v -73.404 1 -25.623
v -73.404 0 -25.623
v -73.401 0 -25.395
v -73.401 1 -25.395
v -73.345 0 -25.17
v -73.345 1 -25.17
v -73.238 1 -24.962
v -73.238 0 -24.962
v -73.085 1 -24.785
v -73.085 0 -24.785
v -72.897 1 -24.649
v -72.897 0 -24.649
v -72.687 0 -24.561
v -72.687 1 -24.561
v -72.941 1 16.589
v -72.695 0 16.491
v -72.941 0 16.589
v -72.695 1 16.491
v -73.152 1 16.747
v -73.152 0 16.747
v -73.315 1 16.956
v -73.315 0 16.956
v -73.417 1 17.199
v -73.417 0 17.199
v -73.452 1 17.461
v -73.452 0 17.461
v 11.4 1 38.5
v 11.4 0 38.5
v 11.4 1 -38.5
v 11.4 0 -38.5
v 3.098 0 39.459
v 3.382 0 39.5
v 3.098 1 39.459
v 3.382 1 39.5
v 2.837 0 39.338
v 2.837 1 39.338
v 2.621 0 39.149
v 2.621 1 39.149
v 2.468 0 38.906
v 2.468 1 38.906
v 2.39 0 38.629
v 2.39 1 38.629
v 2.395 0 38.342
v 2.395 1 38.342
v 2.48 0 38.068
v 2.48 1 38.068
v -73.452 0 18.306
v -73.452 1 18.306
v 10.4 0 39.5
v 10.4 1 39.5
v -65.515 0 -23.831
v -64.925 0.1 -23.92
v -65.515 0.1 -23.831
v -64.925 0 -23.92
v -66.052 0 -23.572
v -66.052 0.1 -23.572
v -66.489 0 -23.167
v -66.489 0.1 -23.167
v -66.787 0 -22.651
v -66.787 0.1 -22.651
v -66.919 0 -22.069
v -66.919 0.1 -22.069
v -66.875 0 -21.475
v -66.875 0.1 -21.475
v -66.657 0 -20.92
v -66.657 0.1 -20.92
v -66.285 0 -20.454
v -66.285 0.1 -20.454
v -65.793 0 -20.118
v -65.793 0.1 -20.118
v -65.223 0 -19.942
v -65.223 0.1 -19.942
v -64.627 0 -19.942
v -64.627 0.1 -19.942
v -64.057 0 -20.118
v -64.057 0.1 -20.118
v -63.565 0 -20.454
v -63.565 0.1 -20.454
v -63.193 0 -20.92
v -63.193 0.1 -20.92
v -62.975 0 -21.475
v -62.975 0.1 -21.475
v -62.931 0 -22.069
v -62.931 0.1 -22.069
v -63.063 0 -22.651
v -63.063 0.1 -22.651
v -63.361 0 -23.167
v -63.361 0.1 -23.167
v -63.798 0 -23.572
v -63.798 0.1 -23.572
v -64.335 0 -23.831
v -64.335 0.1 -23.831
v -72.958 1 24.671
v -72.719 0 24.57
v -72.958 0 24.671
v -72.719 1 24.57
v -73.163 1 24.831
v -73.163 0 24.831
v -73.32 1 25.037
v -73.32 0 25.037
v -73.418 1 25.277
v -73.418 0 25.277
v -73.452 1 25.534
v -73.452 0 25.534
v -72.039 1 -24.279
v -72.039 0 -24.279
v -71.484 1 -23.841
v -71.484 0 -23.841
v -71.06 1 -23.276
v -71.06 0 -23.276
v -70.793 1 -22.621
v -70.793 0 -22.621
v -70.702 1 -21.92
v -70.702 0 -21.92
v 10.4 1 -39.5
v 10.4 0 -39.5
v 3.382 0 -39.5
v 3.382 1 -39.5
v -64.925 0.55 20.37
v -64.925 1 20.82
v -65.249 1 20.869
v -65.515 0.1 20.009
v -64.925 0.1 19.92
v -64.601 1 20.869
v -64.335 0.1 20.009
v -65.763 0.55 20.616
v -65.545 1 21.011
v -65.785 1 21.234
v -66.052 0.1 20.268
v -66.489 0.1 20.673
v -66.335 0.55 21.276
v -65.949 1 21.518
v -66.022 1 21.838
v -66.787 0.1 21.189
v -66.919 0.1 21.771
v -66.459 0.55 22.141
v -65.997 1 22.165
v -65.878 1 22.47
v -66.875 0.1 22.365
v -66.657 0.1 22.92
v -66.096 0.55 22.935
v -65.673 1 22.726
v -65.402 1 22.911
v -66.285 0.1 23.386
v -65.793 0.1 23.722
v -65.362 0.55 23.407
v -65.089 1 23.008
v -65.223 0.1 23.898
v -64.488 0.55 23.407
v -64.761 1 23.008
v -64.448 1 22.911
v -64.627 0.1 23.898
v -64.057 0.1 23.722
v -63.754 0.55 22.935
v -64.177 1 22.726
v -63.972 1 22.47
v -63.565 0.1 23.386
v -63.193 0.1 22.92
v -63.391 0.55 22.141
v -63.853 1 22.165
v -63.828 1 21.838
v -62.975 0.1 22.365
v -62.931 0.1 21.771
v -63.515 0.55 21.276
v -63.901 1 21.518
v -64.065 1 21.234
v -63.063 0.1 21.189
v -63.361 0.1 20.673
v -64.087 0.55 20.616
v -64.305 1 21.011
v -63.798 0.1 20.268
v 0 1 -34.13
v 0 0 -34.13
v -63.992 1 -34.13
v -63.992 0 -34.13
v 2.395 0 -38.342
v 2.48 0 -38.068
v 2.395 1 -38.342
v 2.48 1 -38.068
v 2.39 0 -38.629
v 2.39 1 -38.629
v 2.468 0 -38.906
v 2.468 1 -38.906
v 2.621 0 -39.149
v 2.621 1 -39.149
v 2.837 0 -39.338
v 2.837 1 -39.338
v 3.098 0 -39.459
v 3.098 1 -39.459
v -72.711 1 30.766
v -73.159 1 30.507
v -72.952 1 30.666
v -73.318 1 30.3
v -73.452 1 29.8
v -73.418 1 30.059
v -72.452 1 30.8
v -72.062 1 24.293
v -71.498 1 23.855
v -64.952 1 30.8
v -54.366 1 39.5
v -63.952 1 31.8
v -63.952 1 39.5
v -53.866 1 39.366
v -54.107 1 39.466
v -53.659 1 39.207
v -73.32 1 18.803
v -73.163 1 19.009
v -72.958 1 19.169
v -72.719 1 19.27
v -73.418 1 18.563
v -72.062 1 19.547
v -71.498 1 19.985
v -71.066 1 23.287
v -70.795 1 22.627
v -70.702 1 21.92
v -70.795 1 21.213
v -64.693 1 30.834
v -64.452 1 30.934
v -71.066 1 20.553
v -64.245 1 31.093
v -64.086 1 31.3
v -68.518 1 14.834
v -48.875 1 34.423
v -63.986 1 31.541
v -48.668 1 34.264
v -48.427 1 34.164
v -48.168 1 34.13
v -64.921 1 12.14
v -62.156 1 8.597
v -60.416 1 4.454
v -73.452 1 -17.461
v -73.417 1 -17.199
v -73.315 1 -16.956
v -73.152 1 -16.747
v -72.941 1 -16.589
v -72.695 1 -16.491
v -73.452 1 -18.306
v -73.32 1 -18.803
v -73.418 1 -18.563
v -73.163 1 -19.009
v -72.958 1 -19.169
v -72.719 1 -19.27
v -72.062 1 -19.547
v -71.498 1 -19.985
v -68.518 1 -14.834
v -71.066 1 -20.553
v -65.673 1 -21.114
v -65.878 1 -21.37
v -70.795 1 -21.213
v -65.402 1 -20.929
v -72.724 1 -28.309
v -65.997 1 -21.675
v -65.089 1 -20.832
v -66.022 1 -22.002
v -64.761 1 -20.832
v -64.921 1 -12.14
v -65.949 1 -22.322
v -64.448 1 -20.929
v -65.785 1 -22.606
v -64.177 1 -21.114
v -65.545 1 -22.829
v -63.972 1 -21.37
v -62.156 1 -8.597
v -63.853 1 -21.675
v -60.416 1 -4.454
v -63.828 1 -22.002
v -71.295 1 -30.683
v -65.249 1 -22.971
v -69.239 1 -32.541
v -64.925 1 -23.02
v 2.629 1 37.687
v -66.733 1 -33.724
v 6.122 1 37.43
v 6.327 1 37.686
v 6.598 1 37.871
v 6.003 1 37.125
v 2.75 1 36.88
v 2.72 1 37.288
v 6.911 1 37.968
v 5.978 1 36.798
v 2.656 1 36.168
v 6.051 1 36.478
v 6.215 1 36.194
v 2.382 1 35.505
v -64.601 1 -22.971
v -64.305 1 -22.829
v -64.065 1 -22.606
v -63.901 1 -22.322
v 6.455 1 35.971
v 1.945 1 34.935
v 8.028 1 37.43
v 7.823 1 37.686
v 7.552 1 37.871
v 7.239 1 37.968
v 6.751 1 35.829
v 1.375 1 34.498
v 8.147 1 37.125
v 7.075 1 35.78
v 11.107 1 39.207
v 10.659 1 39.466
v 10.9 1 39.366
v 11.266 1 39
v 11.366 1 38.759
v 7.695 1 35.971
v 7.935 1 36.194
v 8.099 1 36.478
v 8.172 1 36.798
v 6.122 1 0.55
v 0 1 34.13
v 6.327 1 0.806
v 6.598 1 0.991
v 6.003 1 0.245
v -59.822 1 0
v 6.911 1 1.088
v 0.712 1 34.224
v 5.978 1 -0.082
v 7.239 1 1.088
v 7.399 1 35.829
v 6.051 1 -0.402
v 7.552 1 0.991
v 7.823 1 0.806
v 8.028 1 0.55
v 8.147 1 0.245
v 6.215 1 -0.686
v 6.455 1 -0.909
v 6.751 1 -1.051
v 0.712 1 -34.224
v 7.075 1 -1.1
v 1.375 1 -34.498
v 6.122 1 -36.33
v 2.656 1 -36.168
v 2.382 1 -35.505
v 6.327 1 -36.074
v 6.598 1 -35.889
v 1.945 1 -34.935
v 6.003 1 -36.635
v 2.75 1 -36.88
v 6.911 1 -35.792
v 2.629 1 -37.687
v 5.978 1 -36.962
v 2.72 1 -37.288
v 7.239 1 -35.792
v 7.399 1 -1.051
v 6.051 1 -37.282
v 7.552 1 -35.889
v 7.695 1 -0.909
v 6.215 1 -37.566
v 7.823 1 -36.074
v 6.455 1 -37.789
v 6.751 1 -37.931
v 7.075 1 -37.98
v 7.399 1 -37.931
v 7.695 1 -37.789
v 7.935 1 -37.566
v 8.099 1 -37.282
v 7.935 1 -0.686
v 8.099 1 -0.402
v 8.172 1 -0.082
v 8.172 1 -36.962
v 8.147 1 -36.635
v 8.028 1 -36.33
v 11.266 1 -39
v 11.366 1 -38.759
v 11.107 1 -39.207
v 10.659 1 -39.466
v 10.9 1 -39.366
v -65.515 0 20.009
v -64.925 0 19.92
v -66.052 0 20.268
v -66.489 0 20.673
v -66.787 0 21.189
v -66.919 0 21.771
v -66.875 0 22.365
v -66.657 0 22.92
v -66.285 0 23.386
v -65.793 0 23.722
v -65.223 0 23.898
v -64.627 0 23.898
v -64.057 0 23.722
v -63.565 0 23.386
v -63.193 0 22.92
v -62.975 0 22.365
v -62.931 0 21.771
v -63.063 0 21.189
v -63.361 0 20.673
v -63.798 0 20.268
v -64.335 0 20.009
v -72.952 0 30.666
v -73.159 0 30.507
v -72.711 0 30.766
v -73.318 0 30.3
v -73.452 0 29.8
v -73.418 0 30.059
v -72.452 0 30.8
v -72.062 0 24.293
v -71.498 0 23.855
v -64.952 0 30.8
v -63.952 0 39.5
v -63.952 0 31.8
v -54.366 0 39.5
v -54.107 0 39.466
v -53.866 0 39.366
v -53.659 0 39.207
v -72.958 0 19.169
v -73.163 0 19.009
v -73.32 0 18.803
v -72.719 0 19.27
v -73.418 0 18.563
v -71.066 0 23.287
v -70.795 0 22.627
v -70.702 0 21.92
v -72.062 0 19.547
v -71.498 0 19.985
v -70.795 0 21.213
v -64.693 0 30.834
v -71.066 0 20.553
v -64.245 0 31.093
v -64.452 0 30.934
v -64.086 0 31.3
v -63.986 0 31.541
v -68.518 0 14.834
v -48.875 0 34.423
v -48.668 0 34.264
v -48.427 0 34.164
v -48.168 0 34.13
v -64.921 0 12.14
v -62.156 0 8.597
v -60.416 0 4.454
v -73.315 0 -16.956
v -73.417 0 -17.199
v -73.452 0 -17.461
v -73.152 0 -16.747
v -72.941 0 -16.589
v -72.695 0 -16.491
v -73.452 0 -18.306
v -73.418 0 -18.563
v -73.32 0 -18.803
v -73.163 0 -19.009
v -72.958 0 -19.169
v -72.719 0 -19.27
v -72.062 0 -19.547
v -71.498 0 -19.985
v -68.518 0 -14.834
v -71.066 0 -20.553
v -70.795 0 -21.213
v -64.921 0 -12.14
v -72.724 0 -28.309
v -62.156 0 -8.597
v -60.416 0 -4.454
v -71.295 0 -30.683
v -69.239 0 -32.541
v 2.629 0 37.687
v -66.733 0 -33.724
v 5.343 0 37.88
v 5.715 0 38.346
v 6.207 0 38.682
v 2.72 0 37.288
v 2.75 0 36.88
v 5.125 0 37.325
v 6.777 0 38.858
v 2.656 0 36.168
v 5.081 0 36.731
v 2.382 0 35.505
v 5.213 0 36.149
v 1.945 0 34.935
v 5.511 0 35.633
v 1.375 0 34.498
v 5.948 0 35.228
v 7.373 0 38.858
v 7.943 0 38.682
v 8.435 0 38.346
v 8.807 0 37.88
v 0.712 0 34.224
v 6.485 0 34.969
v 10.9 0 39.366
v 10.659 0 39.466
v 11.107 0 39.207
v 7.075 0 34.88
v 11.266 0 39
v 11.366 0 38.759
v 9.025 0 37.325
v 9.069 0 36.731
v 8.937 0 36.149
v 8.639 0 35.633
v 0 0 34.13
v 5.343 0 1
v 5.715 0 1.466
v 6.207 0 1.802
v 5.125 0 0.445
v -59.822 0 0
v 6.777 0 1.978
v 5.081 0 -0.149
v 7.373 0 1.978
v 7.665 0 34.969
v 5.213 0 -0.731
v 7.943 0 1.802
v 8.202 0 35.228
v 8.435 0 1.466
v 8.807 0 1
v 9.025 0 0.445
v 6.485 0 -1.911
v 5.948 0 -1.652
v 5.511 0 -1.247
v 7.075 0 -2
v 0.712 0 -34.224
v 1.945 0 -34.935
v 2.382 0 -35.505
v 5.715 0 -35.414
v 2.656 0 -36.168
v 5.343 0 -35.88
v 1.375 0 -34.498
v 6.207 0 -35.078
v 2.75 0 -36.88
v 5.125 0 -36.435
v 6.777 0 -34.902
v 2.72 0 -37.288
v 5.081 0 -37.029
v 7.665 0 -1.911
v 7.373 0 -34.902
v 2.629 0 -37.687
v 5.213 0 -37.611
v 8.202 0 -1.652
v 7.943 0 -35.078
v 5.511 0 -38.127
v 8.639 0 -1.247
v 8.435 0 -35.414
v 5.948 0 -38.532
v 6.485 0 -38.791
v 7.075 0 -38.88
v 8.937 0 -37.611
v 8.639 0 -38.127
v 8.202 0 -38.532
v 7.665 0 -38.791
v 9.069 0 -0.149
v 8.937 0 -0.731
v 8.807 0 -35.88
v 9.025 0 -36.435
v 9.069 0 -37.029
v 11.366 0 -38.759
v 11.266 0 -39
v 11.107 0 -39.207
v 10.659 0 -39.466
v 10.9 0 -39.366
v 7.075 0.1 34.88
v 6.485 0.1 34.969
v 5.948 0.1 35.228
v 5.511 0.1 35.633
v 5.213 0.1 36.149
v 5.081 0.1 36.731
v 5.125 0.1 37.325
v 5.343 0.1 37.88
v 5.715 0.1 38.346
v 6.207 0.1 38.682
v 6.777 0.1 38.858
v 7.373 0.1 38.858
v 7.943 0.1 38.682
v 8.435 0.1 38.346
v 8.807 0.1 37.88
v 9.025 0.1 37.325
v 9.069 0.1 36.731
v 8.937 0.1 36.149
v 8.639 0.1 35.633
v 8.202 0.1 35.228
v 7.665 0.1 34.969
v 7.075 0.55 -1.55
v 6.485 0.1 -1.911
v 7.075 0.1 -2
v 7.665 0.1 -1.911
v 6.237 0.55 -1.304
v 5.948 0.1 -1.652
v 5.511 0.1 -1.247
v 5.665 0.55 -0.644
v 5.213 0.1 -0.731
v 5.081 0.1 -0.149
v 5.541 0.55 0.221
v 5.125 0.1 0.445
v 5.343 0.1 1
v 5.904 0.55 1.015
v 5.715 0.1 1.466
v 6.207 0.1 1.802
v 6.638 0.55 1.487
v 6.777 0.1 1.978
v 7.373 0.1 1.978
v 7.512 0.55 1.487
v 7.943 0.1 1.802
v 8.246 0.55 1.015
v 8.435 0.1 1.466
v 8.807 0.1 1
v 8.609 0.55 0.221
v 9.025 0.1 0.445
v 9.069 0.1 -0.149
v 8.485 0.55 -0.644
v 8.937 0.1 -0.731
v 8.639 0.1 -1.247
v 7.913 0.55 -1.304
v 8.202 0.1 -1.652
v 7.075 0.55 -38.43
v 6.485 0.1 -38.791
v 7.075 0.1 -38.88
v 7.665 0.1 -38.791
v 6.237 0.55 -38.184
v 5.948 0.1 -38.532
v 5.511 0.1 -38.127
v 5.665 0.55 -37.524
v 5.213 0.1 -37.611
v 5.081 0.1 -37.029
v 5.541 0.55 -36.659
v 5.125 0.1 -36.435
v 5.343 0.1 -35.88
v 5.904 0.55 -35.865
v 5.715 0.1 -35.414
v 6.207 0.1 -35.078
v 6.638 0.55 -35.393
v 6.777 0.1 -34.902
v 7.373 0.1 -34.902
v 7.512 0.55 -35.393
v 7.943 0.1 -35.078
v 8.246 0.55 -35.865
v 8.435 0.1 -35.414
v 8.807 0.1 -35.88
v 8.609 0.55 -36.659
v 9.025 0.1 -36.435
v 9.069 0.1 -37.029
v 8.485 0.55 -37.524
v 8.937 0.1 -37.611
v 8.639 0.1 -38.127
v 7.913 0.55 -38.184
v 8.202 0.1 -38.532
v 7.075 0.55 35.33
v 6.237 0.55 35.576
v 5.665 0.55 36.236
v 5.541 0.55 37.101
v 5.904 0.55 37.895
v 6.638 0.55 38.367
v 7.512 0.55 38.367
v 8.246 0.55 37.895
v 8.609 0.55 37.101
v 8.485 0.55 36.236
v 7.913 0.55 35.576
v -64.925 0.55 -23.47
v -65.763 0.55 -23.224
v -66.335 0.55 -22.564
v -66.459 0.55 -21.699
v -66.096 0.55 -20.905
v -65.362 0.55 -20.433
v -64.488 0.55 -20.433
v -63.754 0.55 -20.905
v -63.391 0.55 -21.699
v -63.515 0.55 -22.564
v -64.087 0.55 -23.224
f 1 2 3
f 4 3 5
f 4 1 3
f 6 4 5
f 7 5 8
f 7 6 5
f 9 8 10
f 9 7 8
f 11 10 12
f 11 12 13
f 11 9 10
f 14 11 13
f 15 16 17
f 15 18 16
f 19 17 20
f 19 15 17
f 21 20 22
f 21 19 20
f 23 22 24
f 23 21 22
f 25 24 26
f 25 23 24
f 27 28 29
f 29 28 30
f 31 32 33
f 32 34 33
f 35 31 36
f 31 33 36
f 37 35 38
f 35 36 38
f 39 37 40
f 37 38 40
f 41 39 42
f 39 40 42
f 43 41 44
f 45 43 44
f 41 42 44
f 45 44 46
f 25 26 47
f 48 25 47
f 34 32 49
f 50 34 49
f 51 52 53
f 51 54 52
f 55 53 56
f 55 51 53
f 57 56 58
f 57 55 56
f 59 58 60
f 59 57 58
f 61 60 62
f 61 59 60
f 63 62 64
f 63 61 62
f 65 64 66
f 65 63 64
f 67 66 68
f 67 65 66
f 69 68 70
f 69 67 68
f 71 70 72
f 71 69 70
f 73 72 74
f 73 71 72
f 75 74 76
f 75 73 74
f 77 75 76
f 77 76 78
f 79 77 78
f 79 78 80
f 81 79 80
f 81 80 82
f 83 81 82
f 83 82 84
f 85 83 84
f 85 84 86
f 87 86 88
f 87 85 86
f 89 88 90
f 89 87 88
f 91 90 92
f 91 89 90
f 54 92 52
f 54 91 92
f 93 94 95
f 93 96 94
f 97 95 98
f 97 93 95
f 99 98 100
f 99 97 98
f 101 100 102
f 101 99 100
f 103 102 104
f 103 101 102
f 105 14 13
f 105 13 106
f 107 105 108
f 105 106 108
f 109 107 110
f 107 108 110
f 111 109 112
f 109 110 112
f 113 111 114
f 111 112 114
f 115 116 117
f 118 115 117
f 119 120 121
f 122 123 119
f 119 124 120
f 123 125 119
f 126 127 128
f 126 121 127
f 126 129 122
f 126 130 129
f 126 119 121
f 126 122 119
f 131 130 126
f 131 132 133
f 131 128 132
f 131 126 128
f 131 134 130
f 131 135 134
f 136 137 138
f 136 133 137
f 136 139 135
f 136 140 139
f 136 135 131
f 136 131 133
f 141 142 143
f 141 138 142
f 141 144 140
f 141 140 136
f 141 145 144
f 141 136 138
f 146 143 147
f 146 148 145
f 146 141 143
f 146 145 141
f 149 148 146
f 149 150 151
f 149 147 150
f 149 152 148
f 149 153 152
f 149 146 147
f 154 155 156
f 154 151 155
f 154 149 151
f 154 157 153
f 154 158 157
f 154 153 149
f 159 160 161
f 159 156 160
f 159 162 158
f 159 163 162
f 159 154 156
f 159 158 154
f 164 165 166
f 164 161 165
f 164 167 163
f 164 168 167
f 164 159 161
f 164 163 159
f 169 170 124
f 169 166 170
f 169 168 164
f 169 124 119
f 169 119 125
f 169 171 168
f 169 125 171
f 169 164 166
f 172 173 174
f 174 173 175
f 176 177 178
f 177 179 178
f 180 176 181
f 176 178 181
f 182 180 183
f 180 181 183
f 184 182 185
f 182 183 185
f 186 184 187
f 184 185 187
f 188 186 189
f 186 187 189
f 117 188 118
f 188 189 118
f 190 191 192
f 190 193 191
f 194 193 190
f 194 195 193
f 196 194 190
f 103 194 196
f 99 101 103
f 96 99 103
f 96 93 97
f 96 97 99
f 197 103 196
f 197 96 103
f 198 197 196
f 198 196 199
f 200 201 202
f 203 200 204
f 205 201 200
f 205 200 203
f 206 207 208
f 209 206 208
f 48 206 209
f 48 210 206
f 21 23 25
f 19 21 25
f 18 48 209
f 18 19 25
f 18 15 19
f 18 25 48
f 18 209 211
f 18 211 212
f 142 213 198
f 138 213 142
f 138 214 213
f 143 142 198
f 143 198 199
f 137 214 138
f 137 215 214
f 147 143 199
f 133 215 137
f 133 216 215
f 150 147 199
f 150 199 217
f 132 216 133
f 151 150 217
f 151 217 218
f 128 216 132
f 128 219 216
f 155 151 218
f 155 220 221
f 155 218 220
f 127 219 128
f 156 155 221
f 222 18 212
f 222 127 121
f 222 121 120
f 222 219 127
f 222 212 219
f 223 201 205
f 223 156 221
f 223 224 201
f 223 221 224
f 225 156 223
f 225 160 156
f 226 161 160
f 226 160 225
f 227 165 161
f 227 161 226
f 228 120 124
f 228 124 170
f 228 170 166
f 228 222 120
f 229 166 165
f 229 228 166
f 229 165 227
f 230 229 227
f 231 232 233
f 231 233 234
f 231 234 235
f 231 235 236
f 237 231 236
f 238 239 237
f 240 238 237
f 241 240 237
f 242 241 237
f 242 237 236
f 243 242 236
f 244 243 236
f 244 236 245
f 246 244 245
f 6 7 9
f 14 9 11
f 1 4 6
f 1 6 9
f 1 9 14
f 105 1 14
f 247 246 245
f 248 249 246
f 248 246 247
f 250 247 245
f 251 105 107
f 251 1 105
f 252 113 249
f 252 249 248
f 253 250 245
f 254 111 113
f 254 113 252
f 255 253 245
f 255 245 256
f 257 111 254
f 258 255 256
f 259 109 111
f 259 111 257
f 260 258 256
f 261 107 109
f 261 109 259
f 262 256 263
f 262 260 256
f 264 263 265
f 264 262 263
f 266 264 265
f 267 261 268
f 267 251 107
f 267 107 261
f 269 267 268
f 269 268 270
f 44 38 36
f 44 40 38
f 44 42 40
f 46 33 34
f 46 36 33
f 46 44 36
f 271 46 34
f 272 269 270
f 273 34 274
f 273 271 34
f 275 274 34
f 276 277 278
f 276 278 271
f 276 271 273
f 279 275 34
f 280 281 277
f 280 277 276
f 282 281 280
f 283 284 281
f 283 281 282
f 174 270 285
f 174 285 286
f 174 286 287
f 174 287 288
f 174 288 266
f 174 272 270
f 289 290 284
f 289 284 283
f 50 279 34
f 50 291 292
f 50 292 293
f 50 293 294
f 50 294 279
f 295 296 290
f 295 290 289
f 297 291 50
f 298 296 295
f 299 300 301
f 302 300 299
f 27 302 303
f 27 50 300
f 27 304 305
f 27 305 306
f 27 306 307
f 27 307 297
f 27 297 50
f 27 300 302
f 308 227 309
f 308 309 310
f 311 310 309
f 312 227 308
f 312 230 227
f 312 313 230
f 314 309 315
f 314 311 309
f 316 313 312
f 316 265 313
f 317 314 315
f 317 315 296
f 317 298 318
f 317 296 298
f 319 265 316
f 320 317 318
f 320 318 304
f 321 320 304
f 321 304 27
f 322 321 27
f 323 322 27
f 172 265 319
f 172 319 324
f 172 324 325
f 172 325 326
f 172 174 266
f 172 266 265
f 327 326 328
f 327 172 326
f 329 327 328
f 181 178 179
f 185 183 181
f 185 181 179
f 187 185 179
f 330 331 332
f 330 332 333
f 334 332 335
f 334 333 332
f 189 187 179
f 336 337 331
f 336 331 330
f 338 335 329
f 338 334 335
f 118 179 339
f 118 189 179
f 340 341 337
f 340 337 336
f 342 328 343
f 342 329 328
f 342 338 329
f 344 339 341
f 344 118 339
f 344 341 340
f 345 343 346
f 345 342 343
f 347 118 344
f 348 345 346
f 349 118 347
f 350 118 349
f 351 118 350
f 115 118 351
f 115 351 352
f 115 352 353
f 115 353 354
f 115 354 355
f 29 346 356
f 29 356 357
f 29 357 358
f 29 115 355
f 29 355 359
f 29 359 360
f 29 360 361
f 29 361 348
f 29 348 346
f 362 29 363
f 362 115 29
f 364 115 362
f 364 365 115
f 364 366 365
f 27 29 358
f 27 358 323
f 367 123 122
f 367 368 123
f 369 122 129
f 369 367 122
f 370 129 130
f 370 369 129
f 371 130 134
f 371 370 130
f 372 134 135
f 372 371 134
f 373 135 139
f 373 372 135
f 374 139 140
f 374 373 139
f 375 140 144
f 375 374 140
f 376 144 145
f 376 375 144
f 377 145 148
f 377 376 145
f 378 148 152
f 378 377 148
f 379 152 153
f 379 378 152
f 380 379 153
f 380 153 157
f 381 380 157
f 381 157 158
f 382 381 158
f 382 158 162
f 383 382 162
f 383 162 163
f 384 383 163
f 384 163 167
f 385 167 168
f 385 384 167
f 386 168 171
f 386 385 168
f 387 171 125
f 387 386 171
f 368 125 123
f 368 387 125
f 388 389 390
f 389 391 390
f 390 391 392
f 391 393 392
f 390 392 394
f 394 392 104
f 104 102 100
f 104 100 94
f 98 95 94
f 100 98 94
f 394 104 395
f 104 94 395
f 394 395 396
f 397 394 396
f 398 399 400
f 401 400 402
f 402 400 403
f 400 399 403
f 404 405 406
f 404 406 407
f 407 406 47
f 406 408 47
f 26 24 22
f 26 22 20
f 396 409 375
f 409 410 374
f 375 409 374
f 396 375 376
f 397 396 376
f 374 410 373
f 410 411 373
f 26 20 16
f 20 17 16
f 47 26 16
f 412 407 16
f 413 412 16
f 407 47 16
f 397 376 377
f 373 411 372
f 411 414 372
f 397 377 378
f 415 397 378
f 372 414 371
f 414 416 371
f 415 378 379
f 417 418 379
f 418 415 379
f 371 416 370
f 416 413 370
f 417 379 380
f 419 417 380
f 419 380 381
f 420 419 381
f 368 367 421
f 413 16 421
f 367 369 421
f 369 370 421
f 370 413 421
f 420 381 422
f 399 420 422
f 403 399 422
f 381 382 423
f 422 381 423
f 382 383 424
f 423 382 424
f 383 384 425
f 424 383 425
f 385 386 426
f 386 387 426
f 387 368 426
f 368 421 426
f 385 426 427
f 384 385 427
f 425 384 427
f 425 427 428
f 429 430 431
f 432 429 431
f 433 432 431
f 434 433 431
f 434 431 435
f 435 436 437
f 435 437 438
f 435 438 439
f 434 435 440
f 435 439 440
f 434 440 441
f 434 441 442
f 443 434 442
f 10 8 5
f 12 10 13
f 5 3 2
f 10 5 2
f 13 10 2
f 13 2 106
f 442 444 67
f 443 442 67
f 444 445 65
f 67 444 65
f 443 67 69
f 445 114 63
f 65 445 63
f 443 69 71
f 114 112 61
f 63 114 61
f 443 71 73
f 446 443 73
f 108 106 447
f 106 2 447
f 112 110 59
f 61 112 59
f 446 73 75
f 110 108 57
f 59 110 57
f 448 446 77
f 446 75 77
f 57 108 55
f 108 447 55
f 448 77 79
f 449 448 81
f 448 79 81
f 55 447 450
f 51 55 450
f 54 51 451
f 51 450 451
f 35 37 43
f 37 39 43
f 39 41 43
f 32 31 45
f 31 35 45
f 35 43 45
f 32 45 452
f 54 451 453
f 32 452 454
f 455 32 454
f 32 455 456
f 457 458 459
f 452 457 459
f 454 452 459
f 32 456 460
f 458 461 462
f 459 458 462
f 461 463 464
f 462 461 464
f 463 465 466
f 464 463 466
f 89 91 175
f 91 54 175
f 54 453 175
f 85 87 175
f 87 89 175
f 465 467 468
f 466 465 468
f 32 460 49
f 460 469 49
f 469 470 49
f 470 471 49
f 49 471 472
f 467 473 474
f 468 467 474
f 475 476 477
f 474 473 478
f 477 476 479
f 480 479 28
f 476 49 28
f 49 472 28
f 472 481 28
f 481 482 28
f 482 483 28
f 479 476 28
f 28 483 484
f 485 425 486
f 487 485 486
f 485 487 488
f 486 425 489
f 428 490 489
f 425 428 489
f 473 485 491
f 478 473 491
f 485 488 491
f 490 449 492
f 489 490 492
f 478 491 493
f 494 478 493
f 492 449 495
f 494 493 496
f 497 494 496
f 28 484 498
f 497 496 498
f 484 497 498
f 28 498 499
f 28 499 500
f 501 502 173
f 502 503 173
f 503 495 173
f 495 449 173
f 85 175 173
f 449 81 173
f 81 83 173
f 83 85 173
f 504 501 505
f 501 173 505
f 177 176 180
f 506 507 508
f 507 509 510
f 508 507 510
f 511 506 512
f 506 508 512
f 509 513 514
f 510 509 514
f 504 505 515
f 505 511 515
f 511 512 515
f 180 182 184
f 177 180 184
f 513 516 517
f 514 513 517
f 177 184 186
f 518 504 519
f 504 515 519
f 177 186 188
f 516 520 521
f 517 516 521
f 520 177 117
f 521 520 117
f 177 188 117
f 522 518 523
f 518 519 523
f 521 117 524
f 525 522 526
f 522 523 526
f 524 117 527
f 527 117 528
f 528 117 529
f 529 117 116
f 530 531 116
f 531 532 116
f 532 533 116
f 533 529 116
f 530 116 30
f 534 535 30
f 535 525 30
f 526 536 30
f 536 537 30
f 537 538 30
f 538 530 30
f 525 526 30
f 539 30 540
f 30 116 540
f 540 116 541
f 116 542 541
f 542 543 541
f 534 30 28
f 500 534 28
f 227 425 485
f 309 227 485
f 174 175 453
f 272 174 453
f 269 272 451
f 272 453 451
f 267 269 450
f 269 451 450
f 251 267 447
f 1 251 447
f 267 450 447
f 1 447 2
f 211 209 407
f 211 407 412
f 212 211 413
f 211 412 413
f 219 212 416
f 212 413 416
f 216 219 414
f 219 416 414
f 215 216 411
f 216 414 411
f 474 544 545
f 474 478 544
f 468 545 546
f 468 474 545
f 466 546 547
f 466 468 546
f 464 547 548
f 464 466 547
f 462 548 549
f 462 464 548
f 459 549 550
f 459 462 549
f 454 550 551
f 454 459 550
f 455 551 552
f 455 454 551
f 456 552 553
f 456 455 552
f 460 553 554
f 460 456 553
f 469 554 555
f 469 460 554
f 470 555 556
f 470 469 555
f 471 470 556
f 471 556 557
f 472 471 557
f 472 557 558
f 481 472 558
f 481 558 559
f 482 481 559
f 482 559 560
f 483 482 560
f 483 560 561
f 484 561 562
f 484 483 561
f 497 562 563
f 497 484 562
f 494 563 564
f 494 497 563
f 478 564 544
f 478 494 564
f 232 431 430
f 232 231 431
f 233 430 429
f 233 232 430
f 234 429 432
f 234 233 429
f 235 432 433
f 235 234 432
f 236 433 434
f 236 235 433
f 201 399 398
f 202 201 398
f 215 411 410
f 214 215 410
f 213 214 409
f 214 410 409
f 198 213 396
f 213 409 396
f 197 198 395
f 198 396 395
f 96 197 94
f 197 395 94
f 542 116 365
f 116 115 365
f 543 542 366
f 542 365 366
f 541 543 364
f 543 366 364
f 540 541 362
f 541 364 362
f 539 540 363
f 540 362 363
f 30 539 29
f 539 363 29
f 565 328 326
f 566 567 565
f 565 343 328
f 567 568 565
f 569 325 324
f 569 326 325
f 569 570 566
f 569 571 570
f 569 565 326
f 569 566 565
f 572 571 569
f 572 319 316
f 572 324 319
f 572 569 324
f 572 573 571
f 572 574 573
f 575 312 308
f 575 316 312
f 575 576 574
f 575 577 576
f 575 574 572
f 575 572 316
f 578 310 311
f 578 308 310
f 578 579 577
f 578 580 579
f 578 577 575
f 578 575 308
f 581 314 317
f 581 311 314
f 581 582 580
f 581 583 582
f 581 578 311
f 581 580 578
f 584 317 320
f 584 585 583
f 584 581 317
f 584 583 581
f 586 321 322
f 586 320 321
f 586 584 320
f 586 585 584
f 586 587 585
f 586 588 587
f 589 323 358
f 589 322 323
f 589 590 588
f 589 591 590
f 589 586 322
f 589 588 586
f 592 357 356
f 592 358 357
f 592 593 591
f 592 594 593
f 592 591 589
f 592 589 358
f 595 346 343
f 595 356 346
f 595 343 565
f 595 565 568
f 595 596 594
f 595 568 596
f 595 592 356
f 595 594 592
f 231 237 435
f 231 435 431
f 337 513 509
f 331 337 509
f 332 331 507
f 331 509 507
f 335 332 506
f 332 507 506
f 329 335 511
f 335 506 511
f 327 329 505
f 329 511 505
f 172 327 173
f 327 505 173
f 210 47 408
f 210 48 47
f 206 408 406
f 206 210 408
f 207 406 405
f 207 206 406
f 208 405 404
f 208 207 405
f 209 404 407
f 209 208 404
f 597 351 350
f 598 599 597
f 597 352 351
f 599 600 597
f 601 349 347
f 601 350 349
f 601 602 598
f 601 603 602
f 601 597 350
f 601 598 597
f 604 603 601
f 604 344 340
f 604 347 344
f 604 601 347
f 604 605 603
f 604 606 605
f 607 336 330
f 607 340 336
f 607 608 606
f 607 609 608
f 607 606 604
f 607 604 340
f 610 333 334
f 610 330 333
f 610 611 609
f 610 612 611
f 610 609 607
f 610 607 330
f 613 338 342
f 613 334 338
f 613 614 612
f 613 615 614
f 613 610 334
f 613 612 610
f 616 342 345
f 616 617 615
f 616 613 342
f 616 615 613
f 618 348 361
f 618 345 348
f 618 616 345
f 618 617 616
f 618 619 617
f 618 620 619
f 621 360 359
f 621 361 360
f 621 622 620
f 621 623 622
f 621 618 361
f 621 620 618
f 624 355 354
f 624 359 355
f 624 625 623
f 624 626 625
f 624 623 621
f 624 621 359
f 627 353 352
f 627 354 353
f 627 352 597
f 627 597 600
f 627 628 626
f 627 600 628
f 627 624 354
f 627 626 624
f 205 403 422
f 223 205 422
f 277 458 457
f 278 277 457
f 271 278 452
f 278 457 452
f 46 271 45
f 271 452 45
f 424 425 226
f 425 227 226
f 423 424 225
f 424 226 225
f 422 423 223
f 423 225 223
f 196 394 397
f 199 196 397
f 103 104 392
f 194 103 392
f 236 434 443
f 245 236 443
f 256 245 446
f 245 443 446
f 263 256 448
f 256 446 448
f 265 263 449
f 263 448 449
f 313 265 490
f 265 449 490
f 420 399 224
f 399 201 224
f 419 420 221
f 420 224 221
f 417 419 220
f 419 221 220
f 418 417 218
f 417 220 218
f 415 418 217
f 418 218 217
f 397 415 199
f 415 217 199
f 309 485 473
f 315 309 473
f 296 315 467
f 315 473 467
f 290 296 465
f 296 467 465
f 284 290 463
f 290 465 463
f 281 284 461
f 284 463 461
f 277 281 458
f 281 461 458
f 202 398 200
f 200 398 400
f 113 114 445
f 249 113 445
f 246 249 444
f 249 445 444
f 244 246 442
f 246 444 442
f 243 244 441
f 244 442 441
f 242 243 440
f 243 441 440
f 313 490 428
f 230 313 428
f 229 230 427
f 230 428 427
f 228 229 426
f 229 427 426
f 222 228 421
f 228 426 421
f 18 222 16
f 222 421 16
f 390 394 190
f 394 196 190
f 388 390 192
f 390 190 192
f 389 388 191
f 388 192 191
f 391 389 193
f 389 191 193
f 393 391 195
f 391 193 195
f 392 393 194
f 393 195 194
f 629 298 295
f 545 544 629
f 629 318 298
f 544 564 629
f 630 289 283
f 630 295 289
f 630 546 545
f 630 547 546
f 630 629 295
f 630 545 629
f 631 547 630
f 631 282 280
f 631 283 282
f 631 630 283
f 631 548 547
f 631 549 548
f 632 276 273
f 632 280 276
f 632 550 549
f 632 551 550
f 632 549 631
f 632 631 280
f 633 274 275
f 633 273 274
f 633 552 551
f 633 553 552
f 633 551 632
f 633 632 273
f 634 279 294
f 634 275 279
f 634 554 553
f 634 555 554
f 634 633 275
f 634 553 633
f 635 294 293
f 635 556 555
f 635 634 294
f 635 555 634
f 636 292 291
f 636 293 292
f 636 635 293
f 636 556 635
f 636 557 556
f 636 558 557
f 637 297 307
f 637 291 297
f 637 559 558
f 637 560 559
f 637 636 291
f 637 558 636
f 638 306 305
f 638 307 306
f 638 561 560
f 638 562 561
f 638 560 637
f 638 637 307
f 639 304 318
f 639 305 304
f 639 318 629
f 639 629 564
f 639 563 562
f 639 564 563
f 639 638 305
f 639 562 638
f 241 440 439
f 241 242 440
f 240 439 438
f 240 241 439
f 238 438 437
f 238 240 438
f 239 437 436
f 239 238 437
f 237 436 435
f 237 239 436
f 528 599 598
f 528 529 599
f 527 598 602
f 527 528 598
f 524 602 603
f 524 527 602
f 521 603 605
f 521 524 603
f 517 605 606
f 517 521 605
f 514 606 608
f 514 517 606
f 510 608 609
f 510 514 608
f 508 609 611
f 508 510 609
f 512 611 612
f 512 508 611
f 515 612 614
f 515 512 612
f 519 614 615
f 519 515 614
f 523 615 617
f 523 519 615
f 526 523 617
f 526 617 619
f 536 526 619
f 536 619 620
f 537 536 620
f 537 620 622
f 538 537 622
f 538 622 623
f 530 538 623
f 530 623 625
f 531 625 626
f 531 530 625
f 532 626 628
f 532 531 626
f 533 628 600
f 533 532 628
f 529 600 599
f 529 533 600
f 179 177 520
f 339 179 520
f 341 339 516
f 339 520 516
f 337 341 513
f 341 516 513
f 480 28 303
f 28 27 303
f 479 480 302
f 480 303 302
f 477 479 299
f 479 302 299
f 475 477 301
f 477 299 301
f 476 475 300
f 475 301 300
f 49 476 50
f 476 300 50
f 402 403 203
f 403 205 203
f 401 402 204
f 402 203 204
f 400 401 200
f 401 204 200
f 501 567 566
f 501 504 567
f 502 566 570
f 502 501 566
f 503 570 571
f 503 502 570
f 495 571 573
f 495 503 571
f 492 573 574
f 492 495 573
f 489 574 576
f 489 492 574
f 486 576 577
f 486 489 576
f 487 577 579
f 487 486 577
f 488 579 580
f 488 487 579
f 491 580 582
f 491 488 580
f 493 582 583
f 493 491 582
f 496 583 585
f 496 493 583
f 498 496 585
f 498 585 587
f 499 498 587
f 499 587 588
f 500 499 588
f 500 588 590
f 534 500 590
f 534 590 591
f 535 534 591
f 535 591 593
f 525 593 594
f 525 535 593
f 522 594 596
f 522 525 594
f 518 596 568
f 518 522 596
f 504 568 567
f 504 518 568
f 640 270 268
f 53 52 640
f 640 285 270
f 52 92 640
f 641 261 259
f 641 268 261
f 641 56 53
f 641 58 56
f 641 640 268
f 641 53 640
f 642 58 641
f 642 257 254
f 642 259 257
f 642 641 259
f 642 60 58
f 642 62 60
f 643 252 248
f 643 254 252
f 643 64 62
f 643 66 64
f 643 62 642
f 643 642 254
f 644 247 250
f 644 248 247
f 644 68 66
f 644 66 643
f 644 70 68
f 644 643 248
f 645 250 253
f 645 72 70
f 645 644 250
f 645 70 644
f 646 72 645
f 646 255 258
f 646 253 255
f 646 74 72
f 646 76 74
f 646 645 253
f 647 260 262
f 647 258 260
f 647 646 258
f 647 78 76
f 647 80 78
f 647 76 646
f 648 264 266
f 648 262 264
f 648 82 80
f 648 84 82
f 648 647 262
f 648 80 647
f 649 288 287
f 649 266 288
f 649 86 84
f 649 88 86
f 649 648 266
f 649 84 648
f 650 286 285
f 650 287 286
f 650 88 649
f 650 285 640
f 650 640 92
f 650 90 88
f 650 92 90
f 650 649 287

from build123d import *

# Parameters (mm, degrees)
SKETCH1_R                  = 1
BASE_SHAPE_DEPTH           = 1
FILLETS_R                  = 1
M2_COUNTERSUNKS_AT_2_COUNT = 2
M2_COUNTERSUNKS_AT_2_PITCH = 73.76
M2_COUNTERSUNKS_AT_3_COUNT = 2
M2_COUNTERSUNKS_AT_3_PITCH = 73.537756289
M2_COUNTERSUNKS_AT_4_COUNT = 2
M2_COUNTERSUNKS_AT_4_PITCH = 92.959345953
M2_COUNTERSUNKS_AT_5_COUNT = 2
M2_COUNTERSUNKS_AT_5_PITCH = 36.88


with BuildPart() as part:
    # Sketch1 → Base shape (new body)
    with BuildSketch(Plane(origin=(0, 0, 0), x_dir=(1, 0, 0), z_dir=(0, 1, 0))):
        with BuildLine():
            ThreePointArc((2.75, 36.88), (1.944543648, 34.935456352), (0, 34.13))
            Line((0, 34.13), (-63.992025159, 34.13))
            ThreePointArc((-63.992025159, 34.13), (-70.681255309, 31.35923015), (-73.452025159, 24.67))
            ThreePointArc((-73.452025159, 24.67), (-71.507481511, 23.864543648), (-70.702025159, 21.92))
            ThreePointArc((-70.702025159, 21.92), (-71.507481511, 19.975456352), (-73.452025159, 19.17))
            Line((-73.452025159, 19.17), (-73.452025159, 16.662625843))
            ThreePointArc((-73.452025159, 16.662625843), (-63.663567803, 10.763596053), (-59.822025159, 0))
            ThreePointArc((-59.822025159, 0), (-63.663567803, -10.763596053), (-73.452025159, -16.662625843))
            Line((-73.452025159, -16.662625843), (-73.452025159, -19.17))
            ThreePointArc((-73.452025159, -19.17), (-71.507481511, -19.975456352), (-70.702025159, -21.92))
            ThreePointArc((-70.702025159, -21.92), (-71.507481511, -23.864543648), (-73.452025159, -24.67))
            Line((-73.452025159, -24.67), (-73.452025159, -30.8))
            Line((-73.452025159, -30.8), (-63.952025159, -30.8))
            Line((-63.952025159, -30.8), (-63.952025159, -34.13))
            Line((-63.952025159, -34.13), (-63.952025159, -39.5))
            Line((-63.952025159, -39.5), (-53.952025159, -39.5))
            Line((-53.952025159, -39.5), (-48.582025159, -34.13))
            Line((-48.582025159, -34.13), (0, -34.13))
            ThreePointArc((0, -34.13), (1.944543648, -34.935456352), (2.75, -36.88))
            ThreePointArc((2.75, -36.88), (2.220381771, -38.502468734), (0.835523788, -39.5))
            Line((0.835523788, -39.5), (11.4, -39.5))
            Line((11.4, -39.5), (11.4, 39.5))
            Line((11.4, 39.5), (0.835523788, 39.5))
            ThreePointArc((0.835523788, 39.5), (2.220381771, 38.502468734), (2.75, 36.88))
        make_face()
        with Locations(Location((-64.925, -21.92, 0), (0, 0, 270))):
            Circle(SKETCH1_R, mode=Mode.SUBTRACT)
        with Locations(Location((7.075, -36.88, 0), (0, 0, 270))):
            Circle(SKETCH1_R, mode=Mode.SUBTRACT)
        with Locations(Location((-64.925, 21.92, 0), (0, 0, 270))):
            Circle(SKETCH1_R, mode=Mode.SUBTRACT)
        with Locations(Location((7.075, 0, 0), (0, 0, 270))):
            Circle(SKETCH1_R, mode=Mode.SUBTRACT)
        with Locations(Location((7.075, 36.88, 0), (0, 0, 270))):
            Circle(SKETCH1_R, mode=Mode.SUBTRACT)
    extrude(amount=BASE_SHAPE_DEPTH)

    # Fillets
    fillets_edges = [part.edges().sort_by_distance(p)[0] for p in [
        (0.835523788, 0.5, -39.5),
        (11.4, 0.5, -39.5),
        (11.4, 0.5, 39.5),
        (0.835523788, 0.5, 39.5),
        (-48.582025159, 0.5, 34.13),
        (-53.952025159, 0.5, 39.5),
        (-63.952025159, 0.5, 30.8),
        (-73.452025159, 0.5, 30.8),
        (-73.452025159, 0.5, 24.67),
        (-73.452025159, 0.5, 19.17),
        (-73.452025159, 0.5, 16.662625843),
        (-73.452025159, 0.5, -16.662625843),
        (-73.452025159, 0.5, -19.17),
        (-73.452025159, 0.5, -24.67),
    ]]
    fillet(fillets_edges, radius=FILLETS_R)

    # Sketch3 → M2 countersunks (revolve, cut)
    with BuildSketch(Plane(origin=(7.075, 0, -36.88), x_dir=(0, 0, -1), z_dir=(1, 0, 0))):
        Polygon((0, 0), (0, 1), (1, 1), (1, 1.1), (2, 0.1), (2, 0), align=None)
    m2_countersunks = revolve(axis=Axis((7.075, -6.35, -36.88), (0, 1, 0)), mode=Mode.SUBTRACT)

    # M2 countersunks at 2: M2 countersunks ×2
    with Locations(*[(0, 0, i * M2_COUNTERSUNKS_AT_2_PITCH) for i in range(1, M2_COUNTERSUNKS_AT_2_COUNT)]):
        add(m2_countersunks, mode=Mode.SUBTRACT)

    # M2 countersunks at 3: M2 countersunks ×2
    with Locations(*[Vector(-0.9790888875801275, 0, 0.2034329133083154) * (i * M2_COUNTERSUNKS_AT_3_PITCH) for i in range(1, M2_COUNTERSUNKS_AT_3_COUNT)]):
        add(m2_countersunks, mode=Mode.SUBTRACT)

    # M2 countersunks at 4: M2 countersunks ×2
    with Locations(*[Vector(-0.7745321275866415, 0, 0.6325345708624239) * (i * M2_COUNTERSUNKS_AT_4_PITCH) for i in range(1, M2_COUNTERSUNKS_AT_4_COUNT)]):
        add(m2_countersunks, mode=Mode.SUBTRACT)

    # M2 countersunks at 5: M2 countersunks ×2
    with Locations(*[(0, 0, i * M2_COUNTERSUNKS_AT_5_PITCH) for i in range(1, M2_COUNTERSUNKS_AT_5_COUNT)]):
        add(m2_countersunks, mode=Mode.SUBTRACT)


solid = part.part
